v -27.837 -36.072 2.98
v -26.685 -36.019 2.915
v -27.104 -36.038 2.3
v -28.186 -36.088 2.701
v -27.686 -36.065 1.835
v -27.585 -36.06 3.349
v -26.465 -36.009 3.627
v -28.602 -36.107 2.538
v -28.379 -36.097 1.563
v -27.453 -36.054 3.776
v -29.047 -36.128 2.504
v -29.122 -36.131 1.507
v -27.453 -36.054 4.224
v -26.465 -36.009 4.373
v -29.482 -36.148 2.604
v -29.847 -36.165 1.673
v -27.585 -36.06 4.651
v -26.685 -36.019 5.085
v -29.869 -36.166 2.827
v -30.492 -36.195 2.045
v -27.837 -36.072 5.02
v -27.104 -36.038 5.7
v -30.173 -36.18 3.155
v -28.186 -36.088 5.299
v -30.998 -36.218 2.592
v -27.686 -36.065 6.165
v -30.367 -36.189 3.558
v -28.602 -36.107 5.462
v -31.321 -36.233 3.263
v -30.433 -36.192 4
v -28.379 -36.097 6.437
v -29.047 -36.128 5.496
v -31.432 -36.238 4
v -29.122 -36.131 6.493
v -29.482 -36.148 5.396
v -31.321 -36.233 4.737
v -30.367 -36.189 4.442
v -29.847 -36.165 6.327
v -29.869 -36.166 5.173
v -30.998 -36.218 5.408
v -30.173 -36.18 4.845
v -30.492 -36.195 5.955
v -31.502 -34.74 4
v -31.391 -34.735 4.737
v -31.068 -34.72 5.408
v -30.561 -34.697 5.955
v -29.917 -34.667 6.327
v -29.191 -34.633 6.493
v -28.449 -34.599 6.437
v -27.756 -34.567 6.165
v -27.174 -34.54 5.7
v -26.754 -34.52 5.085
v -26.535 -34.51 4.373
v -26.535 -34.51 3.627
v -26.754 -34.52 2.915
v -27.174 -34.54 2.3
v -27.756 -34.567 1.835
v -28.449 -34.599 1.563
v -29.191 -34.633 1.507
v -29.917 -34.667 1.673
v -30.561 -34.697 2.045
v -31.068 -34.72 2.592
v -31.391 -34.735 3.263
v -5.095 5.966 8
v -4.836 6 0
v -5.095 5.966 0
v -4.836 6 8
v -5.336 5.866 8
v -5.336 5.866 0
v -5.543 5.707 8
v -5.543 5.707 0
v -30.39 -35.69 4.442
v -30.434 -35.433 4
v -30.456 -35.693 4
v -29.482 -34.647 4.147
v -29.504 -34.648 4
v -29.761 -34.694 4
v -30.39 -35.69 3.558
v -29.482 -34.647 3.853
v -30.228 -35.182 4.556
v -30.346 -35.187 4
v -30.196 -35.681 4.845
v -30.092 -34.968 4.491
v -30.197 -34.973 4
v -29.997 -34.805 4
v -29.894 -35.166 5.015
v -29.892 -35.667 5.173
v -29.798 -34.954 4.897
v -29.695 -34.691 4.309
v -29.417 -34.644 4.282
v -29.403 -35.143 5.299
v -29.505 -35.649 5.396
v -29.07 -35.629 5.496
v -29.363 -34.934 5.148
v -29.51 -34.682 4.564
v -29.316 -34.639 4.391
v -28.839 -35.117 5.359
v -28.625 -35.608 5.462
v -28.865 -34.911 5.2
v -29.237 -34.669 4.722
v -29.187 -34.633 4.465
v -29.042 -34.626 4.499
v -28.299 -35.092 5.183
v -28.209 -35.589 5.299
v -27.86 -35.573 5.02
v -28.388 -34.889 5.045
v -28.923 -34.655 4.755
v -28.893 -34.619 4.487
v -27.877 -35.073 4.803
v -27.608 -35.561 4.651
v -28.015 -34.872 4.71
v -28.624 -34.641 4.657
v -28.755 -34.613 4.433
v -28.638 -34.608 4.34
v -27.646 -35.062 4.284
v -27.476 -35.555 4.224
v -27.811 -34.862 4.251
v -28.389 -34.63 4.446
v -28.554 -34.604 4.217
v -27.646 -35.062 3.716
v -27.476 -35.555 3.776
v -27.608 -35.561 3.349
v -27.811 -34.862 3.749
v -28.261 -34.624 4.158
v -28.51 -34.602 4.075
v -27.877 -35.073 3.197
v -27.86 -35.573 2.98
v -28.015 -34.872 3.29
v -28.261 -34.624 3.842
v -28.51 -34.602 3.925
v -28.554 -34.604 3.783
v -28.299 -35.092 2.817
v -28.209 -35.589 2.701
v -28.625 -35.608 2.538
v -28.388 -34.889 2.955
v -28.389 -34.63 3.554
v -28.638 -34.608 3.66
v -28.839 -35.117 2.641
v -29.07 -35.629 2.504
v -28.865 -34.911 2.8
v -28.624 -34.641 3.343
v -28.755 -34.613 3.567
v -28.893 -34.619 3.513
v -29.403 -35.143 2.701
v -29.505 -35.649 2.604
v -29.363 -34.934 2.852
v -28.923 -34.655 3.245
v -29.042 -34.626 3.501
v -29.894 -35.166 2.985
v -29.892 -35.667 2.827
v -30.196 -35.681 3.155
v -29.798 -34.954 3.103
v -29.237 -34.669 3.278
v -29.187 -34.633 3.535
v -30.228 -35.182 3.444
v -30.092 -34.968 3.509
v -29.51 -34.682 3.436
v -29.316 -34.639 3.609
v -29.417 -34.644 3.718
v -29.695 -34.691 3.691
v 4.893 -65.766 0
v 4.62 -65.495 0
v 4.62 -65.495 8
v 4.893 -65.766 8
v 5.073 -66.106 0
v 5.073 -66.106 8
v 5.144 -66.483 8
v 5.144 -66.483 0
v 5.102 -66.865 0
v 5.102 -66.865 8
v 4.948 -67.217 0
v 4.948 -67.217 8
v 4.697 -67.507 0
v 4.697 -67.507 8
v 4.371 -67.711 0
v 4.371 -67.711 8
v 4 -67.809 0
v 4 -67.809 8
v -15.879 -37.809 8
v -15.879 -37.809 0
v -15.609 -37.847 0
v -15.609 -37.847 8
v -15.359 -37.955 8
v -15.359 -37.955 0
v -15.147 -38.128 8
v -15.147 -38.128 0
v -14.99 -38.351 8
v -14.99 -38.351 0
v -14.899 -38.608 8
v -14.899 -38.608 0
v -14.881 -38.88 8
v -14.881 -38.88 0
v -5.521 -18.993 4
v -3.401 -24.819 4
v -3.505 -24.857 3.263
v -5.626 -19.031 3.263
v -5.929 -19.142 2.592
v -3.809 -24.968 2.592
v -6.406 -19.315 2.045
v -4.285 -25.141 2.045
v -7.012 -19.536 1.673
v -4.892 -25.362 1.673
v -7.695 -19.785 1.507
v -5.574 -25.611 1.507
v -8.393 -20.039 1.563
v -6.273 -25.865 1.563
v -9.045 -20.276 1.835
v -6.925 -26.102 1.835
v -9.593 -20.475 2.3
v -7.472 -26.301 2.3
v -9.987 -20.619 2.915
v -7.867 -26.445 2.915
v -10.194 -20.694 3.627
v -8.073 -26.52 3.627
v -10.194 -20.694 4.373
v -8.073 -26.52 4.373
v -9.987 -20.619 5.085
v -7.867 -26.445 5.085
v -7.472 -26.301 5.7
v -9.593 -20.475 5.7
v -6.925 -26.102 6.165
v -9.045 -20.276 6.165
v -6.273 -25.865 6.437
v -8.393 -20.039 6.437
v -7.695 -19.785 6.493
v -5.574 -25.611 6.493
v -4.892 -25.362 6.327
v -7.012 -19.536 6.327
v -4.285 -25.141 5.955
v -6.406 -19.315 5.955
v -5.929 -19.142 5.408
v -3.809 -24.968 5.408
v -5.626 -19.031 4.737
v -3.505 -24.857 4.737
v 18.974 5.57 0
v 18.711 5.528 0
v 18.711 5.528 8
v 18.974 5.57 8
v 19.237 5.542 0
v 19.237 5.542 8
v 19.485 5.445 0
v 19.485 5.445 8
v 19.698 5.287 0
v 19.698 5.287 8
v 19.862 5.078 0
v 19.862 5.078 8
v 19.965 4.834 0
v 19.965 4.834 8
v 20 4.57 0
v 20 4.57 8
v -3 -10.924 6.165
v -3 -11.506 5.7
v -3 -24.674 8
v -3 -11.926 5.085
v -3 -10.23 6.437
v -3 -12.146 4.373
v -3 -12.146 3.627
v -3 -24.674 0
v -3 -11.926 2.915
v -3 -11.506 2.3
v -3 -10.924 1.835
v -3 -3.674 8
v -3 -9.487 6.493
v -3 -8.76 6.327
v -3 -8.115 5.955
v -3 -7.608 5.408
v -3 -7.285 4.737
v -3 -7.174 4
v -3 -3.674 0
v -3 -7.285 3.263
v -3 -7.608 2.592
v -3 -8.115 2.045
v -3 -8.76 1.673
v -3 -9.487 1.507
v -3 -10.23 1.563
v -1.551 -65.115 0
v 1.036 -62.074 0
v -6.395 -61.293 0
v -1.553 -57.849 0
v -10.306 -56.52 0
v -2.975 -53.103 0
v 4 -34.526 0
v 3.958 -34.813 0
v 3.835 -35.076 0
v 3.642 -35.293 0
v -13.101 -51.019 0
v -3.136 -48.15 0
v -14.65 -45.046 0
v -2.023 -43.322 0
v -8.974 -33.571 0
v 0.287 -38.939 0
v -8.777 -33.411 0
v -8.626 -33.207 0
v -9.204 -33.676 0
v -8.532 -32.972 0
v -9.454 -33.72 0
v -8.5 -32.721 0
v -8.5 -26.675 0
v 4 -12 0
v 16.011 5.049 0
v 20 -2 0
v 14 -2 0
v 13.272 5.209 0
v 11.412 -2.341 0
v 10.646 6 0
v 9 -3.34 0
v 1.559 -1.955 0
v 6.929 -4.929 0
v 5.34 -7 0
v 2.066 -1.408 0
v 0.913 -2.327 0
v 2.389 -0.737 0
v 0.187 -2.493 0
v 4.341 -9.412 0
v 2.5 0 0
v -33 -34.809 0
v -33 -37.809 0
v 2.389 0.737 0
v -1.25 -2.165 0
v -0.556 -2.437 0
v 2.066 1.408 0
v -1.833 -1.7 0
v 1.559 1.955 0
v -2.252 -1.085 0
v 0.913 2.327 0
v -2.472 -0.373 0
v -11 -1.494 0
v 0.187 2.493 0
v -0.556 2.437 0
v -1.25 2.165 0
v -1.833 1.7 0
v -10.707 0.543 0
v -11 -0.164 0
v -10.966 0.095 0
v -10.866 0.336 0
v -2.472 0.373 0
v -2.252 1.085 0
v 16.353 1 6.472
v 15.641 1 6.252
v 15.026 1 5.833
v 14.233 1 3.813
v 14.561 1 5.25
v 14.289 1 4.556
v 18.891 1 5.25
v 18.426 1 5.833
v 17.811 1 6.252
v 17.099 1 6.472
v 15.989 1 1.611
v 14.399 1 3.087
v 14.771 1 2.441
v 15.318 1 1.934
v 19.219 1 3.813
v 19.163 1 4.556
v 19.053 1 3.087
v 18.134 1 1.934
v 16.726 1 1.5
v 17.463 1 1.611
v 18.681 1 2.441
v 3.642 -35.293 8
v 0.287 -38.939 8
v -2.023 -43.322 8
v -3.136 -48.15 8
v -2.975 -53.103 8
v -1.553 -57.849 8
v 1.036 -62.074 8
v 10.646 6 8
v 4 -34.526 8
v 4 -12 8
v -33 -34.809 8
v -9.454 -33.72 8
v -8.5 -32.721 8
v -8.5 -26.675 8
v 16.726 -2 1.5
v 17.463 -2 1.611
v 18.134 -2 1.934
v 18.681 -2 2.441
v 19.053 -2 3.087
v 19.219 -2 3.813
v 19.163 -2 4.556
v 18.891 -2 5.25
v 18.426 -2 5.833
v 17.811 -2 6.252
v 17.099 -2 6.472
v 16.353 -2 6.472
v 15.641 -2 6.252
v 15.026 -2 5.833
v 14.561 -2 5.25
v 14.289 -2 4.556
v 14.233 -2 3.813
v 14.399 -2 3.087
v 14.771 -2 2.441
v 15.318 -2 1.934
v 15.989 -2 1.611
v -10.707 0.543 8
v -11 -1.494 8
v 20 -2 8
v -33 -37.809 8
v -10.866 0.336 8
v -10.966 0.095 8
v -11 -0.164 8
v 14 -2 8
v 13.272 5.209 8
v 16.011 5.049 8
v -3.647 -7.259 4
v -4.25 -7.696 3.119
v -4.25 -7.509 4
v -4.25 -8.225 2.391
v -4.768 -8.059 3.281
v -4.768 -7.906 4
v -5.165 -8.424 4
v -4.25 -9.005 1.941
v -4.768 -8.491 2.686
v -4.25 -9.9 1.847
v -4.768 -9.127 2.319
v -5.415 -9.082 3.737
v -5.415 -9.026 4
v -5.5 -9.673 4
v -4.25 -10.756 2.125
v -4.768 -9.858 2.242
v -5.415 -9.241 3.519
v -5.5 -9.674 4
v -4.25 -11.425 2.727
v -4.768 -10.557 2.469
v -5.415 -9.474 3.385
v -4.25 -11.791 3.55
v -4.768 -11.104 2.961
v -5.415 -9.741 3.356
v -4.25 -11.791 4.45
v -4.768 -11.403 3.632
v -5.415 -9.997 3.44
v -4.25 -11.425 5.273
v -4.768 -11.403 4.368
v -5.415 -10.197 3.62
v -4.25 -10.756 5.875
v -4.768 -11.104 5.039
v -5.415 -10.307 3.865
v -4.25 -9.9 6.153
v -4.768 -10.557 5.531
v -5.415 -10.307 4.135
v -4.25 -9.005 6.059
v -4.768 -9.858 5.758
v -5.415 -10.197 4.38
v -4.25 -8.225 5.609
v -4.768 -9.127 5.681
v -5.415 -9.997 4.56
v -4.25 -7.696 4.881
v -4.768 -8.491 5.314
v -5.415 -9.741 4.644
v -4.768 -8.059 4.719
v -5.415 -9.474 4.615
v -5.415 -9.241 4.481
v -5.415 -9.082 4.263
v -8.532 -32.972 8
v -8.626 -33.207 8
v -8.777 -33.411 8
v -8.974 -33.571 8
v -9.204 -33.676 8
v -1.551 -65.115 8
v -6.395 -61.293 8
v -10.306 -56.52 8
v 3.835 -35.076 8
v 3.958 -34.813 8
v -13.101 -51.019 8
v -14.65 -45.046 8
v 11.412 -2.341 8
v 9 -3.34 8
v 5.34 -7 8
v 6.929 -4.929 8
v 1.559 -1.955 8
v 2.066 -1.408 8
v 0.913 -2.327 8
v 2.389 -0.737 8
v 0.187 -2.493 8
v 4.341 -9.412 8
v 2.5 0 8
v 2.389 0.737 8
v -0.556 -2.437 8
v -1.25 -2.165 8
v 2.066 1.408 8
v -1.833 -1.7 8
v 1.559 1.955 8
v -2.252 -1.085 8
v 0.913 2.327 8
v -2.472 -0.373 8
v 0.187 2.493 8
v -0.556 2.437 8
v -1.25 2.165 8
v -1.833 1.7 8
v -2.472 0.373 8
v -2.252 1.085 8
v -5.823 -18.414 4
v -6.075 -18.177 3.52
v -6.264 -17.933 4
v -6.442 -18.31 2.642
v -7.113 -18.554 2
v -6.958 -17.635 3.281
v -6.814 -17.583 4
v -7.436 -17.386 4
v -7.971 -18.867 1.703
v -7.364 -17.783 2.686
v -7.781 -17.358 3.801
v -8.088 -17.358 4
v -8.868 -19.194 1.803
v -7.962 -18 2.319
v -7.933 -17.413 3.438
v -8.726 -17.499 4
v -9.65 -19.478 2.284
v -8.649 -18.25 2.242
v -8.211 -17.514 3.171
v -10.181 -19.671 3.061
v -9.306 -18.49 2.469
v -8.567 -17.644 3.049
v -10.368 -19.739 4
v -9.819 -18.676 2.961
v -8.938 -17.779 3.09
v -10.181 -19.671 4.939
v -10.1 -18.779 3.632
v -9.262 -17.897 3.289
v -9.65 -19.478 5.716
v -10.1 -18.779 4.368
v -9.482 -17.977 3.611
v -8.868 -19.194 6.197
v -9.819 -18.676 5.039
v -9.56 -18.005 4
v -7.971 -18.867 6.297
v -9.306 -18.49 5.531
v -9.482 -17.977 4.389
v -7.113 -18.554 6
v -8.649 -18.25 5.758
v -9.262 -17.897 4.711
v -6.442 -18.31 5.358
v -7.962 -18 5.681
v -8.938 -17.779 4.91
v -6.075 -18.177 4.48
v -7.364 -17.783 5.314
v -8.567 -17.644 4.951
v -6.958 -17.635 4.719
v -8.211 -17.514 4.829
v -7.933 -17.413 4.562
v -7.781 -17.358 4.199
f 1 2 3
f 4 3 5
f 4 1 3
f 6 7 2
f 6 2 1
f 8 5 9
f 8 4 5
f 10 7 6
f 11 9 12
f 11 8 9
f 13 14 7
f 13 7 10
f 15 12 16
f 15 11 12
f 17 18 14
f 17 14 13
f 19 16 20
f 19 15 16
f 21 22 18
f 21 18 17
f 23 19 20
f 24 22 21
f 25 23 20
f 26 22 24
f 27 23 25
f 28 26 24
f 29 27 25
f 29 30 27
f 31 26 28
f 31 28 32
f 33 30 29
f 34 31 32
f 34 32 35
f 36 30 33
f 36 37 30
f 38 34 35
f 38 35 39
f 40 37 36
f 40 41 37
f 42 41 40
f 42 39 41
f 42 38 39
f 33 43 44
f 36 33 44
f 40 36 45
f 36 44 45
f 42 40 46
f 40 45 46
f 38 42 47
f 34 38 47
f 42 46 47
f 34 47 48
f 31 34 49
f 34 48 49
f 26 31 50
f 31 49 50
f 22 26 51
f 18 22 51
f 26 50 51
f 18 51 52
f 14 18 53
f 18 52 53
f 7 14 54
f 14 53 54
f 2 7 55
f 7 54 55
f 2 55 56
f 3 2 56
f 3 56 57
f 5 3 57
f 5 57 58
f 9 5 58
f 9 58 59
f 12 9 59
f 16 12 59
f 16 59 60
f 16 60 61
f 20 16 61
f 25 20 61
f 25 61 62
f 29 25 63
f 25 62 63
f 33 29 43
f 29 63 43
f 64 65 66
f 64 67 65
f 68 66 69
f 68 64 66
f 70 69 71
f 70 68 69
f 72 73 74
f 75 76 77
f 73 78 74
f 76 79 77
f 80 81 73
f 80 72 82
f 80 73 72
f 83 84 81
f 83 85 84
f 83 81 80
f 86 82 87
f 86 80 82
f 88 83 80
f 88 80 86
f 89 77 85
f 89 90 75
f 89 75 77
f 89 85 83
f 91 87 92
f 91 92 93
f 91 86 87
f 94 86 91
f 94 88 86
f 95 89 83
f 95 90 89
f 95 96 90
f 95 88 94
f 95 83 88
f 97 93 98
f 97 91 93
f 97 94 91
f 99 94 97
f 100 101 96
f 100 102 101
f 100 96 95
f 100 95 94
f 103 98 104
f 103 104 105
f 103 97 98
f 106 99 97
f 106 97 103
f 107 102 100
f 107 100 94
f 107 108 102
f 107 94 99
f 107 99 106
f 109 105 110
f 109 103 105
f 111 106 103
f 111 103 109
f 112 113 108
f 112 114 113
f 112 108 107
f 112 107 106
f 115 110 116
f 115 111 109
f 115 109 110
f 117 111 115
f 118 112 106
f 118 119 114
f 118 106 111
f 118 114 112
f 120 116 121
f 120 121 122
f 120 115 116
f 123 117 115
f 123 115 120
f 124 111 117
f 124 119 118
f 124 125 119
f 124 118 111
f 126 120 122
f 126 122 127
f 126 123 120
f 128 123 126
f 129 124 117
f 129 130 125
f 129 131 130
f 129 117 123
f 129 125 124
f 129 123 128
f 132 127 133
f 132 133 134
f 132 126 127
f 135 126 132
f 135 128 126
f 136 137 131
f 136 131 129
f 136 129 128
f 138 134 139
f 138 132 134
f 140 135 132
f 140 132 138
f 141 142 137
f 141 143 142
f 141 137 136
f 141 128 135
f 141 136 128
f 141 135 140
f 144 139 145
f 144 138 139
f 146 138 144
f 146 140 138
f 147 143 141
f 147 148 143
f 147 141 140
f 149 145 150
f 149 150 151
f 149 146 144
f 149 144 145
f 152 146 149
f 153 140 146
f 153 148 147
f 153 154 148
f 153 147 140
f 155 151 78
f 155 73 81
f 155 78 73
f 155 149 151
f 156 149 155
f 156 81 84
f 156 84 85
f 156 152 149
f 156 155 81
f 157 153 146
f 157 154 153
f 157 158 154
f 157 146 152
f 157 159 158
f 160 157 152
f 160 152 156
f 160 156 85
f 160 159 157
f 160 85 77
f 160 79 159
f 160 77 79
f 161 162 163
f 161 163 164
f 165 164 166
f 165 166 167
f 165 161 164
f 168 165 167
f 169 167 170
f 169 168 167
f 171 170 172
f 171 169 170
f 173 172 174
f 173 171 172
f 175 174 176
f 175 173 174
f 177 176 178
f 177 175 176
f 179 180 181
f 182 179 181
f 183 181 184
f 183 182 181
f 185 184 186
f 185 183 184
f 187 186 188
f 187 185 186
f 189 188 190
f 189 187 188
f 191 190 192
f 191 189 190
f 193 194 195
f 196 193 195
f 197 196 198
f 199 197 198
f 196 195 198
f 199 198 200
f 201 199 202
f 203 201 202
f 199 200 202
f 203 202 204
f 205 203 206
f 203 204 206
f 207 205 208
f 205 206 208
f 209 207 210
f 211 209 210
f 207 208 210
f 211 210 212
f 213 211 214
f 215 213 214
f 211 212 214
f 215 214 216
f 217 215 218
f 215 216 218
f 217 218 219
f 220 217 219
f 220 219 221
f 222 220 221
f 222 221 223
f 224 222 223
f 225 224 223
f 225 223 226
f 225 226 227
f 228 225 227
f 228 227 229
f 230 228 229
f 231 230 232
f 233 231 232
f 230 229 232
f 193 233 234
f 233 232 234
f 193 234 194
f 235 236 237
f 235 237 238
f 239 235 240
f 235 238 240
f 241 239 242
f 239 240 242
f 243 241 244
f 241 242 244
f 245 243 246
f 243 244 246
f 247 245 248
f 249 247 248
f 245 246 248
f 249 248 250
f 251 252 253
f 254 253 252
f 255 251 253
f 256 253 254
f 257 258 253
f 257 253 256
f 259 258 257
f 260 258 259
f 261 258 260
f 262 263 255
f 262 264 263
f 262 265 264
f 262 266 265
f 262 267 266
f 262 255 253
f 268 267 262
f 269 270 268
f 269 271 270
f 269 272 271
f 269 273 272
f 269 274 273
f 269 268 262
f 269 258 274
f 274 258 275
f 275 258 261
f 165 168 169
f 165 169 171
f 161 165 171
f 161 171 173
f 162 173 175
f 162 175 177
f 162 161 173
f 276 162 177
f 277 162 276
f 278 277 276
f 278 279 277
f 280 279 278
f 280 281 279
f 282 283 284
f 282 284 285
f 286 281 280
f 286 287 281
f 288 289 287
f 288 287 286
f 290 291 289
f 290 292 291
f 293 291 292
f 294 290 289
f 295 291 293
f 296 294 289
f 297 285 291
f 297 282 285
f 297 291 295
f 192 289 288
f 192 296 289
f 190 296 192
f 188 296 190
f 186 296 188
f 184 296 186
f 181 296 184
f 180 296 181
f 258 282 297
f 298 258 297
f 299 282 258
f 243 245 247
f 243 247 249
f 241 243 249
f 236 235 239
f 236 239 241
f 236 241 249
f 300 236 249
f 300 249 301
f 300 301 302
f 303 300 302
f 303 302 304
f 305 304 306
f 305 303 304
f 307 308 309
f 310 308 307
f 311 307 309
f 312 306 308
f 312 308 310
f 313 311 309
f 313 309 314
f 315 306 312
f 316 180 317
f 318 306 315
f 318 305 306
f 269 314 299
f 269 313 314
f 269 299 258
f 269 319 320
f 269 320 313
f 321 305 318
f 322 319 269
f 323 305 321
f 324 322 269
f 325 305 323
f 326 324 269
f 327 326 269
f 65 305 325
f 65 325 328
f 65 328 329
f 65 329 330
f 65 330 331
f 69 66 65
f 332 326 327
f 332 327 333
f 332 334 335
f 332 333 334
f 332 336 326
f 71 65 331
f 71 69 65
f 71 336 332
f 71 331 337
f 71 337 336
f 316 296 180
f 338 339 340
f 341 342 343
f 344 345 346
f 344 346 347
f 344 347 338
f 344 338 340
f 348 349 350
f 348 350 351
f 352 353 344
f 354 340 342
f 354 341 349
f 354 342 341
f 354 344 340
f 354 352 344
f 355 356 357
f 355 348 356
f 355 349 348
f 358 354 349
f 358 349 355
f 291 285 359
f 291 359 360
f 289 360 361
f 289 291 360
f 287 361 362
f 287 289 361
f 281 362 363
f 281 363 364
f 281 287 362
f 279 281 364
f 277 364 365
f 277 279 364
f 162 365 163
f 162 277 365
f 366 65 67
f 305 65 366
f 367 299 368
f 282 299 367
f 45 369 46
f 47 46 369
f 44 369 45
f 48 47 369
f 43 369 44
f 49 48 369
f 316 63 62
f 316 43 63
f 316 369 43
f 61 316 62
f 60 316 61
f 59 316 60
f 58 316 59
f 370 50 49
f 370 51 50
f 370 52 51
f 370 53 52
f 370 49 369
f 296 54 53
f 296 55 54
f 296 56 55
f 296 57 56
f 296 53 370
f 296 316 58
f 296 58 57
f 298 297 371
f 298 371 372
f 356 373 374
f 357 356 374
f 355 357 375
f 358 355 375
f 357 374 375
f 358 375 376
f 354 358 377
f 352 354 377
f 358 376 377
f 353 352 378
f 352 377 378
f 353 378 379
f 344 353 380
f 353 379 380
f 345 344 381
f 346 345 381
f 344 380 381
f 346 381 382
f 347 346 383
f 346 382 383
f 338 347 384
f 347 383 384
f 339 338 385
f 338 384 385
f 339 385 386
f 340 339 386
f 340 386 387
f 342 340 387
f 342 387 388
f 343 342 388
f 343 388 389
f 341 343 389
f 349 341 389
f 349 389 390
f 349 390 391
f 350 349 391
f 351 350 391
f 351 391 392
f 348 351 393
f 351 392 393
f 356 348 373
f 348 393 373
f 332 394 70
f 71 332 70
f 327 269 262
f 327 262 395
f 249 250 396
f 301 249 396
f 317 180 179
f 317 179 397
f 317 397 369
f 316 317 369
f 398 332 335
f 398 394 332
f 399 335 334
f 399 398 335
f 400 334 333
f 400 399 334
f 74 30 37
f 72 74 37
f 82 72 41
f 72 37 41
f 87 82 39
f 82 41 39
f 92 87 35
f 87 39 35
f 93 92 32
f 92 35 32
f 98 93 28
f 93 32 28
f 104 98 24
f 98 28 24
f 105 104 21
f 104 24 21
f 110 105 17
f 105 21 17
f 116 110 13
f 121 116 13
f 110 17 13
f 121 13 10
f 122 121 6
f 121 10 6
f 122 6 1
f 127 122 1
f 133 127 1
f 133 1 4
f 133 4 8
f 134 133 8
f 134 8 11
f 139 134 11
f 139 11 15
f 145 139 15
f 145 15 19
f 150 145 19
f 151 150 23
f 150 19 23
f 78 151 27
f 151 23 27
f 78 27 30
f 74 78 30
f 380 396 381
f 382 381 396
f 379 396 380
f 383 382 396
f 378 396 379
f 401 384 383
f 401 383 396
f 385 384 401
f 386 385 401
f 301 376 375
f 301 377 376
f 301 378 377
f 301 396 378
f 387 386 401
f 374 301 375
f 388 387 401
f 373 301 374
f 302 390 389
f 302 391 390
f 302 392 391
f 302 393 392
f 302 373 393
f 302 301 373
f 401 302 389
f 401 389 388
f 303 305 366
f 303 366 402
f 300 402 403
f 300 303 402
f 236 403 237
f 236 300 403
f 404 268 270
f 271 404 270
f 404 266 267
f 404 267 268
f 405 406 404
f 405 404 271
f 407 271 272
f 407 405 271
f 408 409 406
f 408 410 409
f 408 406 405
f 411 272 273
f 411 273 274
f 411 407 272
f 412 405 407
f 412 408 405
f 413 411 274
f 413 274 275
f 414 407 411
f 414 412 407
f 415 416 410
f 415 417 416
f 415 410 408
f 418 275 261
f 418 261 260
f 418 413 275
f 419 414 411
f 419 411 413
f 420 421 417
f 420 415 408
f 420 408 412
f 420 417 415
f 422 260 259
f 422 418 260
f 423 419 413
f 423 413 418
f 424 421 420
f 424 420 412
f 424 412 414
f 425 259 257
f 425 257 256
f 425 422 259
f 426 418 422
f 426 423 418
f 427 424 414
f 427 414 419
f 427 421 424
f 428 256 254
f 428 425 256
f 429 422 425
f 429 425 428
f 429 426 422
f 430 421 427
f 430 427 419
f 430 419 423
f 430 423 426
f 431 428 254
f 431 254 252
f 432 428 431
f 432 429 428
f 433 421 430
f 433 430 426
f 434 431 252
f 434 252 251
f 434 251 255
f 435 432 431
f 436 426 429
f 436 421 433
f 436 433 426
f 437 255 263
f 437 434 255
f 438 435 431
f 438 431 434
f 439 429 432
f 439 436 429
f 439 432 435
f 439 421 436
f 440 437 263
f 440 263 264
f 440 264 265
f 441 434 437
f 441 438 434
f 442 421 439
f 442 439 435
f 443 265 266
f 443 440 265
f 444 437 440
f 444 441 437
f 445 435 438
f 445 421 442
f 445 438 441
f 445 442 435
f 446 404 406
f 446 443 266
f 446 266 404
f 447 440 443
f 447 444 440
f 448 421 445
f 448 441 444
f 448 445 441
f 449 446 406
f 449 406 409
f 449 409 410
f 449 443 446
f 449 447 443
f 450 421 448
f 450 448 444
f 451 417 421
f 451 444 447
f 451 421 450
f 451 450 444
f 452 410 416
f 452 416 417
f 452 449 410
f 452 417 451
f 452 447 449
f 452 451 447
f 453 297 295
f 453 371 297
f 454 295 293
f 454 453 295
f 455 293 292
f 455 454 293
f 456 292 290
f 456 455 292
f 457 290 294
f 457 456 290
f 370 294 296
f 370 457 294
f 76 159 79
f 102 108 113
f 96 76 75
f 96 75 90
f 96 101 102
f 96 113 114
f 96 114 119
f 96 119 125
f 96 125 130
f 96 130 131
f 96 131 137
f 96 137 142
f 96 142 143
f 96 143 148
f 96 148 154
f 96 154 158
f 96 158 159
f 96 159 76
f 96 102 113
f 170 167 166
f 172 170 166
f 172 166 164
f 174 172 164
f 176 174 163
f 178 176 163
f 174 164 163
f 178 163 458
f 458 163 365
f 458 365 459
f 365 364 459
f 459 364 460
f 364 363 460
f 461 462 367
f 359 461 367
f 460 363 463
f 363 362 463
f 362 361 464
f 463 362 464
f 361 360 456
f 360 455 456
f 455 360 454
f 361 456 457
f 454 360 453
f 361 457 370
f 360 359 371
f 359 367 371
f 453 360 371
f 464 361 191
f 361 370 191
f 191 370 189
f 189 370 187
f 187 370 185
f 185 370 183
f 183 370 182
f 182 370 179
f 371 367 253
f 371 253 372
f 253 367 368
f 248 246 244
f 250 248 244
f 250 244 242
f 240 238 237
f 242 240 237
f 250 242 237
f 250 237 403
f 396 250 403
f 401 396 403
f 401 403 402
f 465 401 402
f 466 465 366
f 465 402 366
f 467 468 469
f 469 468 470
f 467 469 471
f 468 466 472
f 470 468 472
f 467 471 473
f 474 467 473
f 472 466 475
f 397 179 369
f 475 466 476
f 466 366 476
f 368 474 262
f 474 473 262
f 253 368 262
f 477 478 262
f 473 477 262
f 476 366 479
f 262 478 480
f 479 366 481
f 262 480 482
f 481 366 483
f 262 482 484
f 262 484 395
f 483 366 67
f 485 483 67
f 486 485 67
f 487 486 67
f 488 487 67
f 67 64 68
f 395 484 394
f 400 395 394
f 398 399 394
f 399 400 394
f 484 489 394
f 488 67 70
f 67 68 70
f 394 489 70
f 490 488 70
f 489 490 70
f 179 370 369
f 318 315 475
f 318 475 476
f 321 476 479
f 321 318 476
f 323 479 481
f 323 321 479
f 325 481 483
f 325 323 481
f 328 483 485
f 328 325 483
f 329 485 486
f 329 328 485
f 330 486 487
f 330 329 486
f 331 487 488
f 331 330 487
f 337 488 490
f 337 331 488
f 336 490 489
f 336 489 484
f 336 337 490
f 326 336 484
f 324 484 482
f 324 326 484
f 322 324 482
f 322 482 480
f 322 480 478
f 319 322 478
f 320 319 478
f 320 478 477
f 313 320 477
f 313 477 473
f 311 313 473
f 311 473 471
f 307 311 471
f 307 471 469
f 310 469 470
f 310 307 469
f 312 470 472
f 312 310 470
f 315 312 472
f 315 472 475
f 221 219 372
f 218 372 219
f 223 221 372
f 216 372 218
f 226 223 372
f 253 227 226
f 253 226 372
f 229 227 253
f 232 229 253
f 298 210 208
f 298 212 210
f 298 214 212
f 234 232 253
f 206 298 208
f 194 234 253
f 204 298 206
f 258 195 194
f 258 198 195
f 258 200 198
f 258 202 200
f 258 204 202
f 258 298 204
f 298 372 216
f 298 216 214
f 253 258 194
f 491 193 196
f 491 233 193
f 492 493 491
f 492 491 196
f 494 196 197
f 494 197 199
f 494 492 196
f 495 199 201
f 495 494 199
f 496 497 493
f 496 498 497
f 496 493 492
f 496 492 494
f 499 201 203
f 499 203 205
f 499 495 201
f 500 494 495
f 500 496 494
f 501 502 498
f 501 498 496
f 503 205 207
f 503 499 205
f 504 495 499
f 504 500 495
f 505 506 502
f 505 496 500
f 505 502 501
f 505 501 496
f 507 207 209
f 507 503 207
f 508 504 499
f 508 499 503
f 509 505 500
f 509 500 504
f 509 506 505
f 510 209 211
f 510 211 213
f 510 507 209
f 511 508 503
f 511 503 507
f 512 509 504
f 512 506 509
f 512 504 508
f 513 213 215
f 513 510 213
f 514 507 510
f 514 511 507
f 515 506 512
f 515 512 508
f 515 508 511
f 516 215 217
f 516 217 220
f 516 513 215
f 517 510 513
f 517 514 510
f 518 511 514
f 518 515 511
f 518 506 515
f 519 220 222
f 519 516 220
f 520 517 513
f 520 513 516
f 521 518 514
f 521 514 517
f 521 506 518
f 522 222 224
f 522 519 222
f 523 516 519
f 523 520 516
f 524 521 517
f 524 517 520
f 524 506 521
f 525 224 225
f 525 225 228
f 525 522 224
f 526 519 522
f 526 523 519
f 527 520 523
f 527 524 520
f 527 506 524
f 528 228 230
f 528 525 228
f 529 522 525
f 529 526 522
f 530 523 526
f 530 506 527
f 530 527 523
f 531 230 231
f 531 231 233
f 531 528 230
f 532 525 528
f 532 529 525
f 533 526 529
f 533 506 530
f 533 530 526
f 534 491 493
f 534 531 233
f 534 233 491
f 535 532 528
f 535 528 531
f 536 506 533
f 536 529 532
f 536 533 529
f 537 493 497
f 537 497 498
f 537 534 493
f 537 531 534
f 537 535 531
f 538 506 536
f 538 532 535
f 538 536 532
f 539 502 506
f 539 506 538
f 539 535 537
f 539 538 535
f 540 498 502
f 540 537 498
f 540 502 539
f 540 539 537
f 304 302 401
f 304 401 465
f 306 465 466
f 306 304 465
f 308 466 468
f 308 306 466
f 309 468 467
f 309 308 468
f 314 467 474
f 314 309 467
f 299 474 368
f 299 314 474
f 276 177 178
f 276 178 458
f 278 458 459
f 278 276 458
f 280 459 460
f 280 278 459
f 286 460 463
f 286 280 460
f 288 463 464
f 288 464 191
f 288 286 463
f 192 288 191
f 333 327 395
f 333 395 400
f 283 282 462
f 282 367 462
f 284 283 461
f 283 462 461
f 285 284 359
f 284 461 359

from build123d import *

# Parameters (mm, degrees)
SKETCH_1_R          = 2.5
EXTRUDE_1_DEPTH     = 8
FILLET_8_R          = 1
SKETCH_2_R          = 2.5
EXTRUDE_2_DEPTH     = 2.5
FILLET_7_R          = 2.5
SKETCH_3_R          = 2.5
EXTRUDE_3_DEPTH     = 8.7
FILLET_4_R          = 2.5
FILLET_5_R          = 1
FILLET_6_R          = 1
SKETCH_4_R          = 2.5
CUT_EXTRUDE_1_DEPTH = 3
SKETCH_5_R          = 2.5
CUT_EXTRUDE_2_DEPTH = 1.5
SKETCH_7_R          = 1.5
EXTRUDE_4_DEPTH     = 1.5
FILLET_9_R          = 1


with BuildPart() as part:
    # 스케치1 → 보스-돌출1 (new body)
    with BuildSketch(Plane.XY):
        with BuildLine():
            Line((-11, 0.25), (-5.25, 6))
            Line((-5.25, 6), (10.645895628, 6))
            ThreePointArc((10.645895628, 6), (15.322947814, 5.028470802), (20, 6))
            Line((20, 6), (20, -2))
            Line((20, -2), (14, -2))
            ThreePointArc((14, -2), (6.928932188, -4.928932188), (4, -12))
            Line((4, -12), (4, -35))
            ThreePointArc((4, -35), (-3.221957743, -50.400925483), (4.620254931, -65.495456935))
            ThreePointArc((4.620254931, -65.495456935), (5.101546116, -66.864569331), (4.000000416, -67.809401077))
            ThreePointArc((4.000000416, -67.809401077), (-10.595076269, -56.067028756), (-14.785374908, -37.809401077))
            Line((-14.785374908, -37.809401077), (-33, -37.809401077))
            Line((-33, -37.809401077), (-33, -34.809401077))
            Line((-33, -34.809401077), (-8.5, -33.675426481))
            Line((-8.5, -33.675426481), (-8.5, -26.675426481))
            Line((-8.5, -26.675426481), (-3, -24.673590192))
            Line((-3, -24.673590192), (-3, -3.673590192))
            Line((-3, -3.673590192), (-11, -1.493890685))
            Line((-11, -1.493890685), (-11, 0.25))
        make_face()
        Circle(SKETCH_1_R, mode=Mode.SUBTRACT)
    extrude(amount=EXTRUDE_1_DEPTH)

    # 필렛8
    fillet_8_edges = [part.edges().sort_by_distance(p)[0] for p in [
        (4, -35, 4),
        (-14.785374908, -37.809401077, 4),
        (-8.5, -33.675426481, 4),
    ]]
    fillet(fillet_8_edges, radius=FILLET_8_R)

    # 스케치2 → 보스-돌출2 (add)
    with BuildSketch(Plane.ZY.offset(3)):
        with Locations(Location((4, -9.673590192, 0), (0, 0, 90))):
            Circle(SKETCH_2_R)
    extrude(amount=EXTRUDE_2_DEPTH)

    # 필렛7
    fillet_7_edges = [part.edges().sort_by_distance(p)[0] for p in [
        (-5.5, -12.173590192, 4),
    ]]
    fillet(fillet_7_edges, radius=FILLET_7_R - 0.0001)  # a hair under: the kernel refuses the full size

    # 스케치3 → 보스-돌출3 (add)
    with BuildSketch(Plane(origin=(7.579005696, -20.823147011, 0), x_dir=(0.9396926207859105, 0.34202014332566305, 0), z_dir=(-0.34202014332566305, 0.9396926207859105, 0))):
        with Locations((-14.184431591, -4)):
            Circle(SKETCH_3_R)
    extrude(amount=EXTRUDE_3_DEPTH)

    # 필렛4
    fillet_4_edges = [part.edges().sort_by_distance(p)[0] for p in [
        (-11.074806799, -18.354232894, 4),
    ]]
    fillet(fillet_4_edges, radius=FILLET_4_R)

    # 필렛5
    fillet_5_edges = [part.edges().sort_by_distance(p)[0] for p in [
        (20, 6, 4),
    ]]
    fillet(fillet_5_edges, radius=FILLET_5_R)

    # 필렛6
    fillet_6_edges = [part.edges().sort_by_distance(p)[0] for p in [
        (-11, 0.25, 4),
        (-5.25, 6, 4),
    ]]
    fillet(fillet_6_edges, radius=FILLET_6_R)

    # 스케치4 → 컷-돌출1 (cut)
    with BuildSketch(Plane.XZ.offset(2)):
        with Locations(Location((16.726046575, 4, 0), (0, 0, 270))):
            Circle(SKETCH_4_R)
    extrude(amount=-CUT_EXTRUDE_1_DEPTH, mode=Mode.SUBTRACT)

    # 스케치5 → 컷-돌출2 (cut)
    with BuildSketch(Plane(origin=(1.537153943, -33.210860048, 0), x_dir=(0.9989305822499971, 0.046235179740992706, 0), z_dir=(-0.046235179740992706, 0.9989305822499971, 0))):
        with Locations(Location((-30.57412813, -4, 0), (0, 0, 180))):
            Circle(SKETCH_5_R)
    extrude(amount=-CUT_EXTRUDE_2_DEPTH, mode=Mode.SUBTRACT)

    # 스케치7 → 보스-돌출4 (add)
    with BuildSketch(Plane(origin=(1.606506713, -34.709255922, 0), x_dir=(0.9989305822499971, 0.04623517974099271, 0), z_dir=(-0.04623517974099271, 0.9989305822499971, 0))):
        with Locations(Location((-30.57412813, -4, 0), (0, 0, 180))):
            Circle(SKETCH_7_R)
    extrude(amount=EXTRUDE_4_DEPTH)

    # 필렛9
    fillet_9_edges = [part.edges().sort_by_distance(p)[0] for p in [
        (-27.505881798, -34.555107588, 4),
    ]]
    fillet(fillet_9_edges, radius=FILLET_9_R)


solid = part.part
